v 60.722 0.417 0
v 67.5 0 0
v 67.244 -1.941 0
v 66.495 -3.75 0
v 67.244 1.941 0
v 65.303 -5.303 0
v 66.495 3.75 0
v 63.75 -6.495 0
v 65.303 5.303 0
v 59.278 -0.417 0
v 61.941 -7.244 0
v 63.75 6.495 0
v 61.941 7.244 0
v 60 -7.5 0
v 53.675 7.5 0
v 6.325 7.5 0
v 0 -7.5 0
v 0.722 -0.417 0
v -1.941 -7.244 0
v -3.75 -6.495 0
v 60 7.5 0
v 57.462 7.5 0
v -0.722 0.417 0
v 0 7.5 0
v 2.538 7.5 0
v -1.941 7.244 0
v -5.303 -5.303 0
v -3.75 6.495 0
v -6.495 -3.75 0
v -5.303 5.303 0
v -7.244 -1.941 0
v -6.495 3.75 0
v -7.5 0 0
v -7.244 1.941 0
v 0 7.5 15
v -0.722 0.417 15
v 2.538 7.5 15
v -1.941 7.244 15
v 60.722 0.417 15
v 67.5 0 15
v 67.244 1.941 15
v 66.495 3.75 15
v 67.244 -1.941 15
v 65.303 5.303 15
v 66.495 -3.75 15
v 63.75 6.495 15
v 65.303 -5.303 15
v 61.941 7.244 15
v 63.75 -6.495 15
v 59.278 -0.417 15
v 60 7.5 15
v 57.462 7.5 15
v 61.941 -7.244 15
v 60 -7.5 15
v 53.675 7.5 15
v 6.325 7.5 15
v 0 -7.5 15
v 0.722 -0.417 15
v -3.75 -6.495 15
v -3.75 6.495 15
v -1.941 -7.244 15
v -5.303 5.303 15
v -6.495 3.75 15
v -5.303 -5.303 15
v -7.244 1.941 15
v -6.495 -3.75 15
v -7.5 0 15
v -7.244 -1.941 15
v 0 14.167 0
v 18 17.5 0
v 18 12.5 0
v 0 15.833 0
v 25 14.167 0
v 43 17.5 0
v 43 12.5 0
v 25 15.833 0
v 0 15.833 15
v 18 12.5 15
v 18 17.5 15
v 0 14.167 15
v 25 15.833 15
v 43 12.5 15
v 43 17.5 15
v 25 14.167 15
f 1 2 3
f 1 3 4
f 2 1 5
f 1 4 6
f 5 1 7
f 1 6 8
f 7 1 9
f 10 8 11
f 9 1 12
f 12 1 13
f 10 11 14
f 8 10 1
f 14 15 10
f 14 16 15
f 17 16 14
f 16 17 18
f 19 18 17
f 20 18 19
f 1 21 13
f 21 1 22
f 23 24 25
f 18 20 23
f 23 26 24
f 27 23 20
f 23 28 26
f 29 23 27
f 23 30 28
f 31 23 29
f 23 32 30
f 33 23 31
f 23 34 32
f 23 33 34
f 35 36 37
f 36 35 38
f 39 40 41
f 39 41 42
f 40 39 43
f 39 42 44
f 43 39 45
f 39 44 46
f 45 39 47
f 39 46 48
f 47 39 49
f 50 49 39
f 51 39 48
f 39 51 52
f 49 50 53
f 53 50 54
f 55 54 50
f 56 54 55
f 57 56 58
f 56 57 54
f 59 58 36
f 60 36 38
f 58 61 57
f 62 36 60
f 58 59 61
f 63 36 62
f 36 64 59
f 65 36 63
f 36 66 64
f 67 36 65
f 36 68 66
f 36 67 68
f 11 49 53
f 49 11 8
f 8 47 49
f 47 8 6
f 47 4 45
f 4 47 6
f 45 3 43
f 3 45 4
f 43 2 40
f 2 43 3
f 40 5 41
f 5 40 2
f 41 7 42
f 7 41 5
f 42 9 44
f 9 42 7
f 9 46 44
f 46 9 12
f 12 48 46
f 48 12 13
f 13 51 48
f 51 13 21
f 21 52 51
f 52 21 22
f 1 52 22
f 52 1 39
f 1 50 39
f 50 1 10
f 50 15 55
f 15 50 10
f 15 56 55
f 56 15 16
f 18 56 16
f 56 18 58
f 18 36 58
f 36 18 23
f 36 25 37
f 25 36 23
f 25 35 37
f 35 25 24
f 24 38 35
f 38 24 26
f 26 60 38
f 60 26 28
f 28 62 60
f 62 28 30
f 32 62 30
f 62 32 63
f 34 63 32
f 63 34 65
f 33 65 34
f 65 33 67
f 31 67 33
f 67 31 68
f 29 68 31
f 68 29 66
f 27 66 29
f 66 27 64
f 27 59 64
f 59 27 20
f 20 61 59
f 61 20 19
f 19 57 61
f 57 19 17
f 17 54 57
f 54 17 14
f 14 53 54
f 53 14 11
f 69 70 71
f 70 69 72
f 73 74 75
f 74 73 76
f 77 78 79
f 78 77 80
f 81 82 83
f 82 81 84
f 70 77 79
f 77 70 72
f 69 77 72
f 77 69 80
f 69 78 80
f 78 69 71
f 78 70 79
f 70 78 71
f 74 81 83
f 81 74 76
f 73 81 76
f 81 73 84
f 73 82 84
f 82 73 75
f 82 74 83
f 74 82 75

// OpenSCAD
sanding_block_width = 15;
sanding_block_length = 60;
sanding_block_wedge_angle = 60;
sanding_block_diameter = 15;
sanding_block_with_wedges = true;

module __sanding_block_body()
{
    hull() {
        circle(d = sanding_block_diameter);
        translate([sanding_block_length, 0, 0]) {
            circle(d = sanding_block_diameter);
        }
    }
}

module __sanding_block_wedge()
{
    width_long = sanding_block_width / 3;
    width_short = width_long / 3;
    length = sanding_block_diameter * 1.2;

    polygon(
        points = [
            [0, width_short / 2],
            [0, width_short / -2],
            [length, width_long / -2],
            [length, width_long / 2]
        ]
    );
}

module sanding_block()
{
    linear_extrude(height = sanding_block_width) {
        difference() {
            __sanding_block_body();
            rotate(sanding_block_wedge_angle) {
                __sanding_block_wedge();
            }
            translate([sanding_block_length, 0, 0]) {
                rotate(180 - sanding_block_wedge_angle) {
                    __sanding_block_wedge();
                }
            }
        }
    }
}

module sanding_block_wedges()
{
    linear_extrude(height = sanding_block_width) {
        translate([0, sanding_block_width, 0]) {
            __sanding_block_wedge();
            translate([sanding_block_width + 10, 0, 0]) {
                __sanding_block_wedge();
            }
        }
    }
}

sanding_block();
if (sanding_block_with_wedges) {
    sanding_block_wedges();
}
